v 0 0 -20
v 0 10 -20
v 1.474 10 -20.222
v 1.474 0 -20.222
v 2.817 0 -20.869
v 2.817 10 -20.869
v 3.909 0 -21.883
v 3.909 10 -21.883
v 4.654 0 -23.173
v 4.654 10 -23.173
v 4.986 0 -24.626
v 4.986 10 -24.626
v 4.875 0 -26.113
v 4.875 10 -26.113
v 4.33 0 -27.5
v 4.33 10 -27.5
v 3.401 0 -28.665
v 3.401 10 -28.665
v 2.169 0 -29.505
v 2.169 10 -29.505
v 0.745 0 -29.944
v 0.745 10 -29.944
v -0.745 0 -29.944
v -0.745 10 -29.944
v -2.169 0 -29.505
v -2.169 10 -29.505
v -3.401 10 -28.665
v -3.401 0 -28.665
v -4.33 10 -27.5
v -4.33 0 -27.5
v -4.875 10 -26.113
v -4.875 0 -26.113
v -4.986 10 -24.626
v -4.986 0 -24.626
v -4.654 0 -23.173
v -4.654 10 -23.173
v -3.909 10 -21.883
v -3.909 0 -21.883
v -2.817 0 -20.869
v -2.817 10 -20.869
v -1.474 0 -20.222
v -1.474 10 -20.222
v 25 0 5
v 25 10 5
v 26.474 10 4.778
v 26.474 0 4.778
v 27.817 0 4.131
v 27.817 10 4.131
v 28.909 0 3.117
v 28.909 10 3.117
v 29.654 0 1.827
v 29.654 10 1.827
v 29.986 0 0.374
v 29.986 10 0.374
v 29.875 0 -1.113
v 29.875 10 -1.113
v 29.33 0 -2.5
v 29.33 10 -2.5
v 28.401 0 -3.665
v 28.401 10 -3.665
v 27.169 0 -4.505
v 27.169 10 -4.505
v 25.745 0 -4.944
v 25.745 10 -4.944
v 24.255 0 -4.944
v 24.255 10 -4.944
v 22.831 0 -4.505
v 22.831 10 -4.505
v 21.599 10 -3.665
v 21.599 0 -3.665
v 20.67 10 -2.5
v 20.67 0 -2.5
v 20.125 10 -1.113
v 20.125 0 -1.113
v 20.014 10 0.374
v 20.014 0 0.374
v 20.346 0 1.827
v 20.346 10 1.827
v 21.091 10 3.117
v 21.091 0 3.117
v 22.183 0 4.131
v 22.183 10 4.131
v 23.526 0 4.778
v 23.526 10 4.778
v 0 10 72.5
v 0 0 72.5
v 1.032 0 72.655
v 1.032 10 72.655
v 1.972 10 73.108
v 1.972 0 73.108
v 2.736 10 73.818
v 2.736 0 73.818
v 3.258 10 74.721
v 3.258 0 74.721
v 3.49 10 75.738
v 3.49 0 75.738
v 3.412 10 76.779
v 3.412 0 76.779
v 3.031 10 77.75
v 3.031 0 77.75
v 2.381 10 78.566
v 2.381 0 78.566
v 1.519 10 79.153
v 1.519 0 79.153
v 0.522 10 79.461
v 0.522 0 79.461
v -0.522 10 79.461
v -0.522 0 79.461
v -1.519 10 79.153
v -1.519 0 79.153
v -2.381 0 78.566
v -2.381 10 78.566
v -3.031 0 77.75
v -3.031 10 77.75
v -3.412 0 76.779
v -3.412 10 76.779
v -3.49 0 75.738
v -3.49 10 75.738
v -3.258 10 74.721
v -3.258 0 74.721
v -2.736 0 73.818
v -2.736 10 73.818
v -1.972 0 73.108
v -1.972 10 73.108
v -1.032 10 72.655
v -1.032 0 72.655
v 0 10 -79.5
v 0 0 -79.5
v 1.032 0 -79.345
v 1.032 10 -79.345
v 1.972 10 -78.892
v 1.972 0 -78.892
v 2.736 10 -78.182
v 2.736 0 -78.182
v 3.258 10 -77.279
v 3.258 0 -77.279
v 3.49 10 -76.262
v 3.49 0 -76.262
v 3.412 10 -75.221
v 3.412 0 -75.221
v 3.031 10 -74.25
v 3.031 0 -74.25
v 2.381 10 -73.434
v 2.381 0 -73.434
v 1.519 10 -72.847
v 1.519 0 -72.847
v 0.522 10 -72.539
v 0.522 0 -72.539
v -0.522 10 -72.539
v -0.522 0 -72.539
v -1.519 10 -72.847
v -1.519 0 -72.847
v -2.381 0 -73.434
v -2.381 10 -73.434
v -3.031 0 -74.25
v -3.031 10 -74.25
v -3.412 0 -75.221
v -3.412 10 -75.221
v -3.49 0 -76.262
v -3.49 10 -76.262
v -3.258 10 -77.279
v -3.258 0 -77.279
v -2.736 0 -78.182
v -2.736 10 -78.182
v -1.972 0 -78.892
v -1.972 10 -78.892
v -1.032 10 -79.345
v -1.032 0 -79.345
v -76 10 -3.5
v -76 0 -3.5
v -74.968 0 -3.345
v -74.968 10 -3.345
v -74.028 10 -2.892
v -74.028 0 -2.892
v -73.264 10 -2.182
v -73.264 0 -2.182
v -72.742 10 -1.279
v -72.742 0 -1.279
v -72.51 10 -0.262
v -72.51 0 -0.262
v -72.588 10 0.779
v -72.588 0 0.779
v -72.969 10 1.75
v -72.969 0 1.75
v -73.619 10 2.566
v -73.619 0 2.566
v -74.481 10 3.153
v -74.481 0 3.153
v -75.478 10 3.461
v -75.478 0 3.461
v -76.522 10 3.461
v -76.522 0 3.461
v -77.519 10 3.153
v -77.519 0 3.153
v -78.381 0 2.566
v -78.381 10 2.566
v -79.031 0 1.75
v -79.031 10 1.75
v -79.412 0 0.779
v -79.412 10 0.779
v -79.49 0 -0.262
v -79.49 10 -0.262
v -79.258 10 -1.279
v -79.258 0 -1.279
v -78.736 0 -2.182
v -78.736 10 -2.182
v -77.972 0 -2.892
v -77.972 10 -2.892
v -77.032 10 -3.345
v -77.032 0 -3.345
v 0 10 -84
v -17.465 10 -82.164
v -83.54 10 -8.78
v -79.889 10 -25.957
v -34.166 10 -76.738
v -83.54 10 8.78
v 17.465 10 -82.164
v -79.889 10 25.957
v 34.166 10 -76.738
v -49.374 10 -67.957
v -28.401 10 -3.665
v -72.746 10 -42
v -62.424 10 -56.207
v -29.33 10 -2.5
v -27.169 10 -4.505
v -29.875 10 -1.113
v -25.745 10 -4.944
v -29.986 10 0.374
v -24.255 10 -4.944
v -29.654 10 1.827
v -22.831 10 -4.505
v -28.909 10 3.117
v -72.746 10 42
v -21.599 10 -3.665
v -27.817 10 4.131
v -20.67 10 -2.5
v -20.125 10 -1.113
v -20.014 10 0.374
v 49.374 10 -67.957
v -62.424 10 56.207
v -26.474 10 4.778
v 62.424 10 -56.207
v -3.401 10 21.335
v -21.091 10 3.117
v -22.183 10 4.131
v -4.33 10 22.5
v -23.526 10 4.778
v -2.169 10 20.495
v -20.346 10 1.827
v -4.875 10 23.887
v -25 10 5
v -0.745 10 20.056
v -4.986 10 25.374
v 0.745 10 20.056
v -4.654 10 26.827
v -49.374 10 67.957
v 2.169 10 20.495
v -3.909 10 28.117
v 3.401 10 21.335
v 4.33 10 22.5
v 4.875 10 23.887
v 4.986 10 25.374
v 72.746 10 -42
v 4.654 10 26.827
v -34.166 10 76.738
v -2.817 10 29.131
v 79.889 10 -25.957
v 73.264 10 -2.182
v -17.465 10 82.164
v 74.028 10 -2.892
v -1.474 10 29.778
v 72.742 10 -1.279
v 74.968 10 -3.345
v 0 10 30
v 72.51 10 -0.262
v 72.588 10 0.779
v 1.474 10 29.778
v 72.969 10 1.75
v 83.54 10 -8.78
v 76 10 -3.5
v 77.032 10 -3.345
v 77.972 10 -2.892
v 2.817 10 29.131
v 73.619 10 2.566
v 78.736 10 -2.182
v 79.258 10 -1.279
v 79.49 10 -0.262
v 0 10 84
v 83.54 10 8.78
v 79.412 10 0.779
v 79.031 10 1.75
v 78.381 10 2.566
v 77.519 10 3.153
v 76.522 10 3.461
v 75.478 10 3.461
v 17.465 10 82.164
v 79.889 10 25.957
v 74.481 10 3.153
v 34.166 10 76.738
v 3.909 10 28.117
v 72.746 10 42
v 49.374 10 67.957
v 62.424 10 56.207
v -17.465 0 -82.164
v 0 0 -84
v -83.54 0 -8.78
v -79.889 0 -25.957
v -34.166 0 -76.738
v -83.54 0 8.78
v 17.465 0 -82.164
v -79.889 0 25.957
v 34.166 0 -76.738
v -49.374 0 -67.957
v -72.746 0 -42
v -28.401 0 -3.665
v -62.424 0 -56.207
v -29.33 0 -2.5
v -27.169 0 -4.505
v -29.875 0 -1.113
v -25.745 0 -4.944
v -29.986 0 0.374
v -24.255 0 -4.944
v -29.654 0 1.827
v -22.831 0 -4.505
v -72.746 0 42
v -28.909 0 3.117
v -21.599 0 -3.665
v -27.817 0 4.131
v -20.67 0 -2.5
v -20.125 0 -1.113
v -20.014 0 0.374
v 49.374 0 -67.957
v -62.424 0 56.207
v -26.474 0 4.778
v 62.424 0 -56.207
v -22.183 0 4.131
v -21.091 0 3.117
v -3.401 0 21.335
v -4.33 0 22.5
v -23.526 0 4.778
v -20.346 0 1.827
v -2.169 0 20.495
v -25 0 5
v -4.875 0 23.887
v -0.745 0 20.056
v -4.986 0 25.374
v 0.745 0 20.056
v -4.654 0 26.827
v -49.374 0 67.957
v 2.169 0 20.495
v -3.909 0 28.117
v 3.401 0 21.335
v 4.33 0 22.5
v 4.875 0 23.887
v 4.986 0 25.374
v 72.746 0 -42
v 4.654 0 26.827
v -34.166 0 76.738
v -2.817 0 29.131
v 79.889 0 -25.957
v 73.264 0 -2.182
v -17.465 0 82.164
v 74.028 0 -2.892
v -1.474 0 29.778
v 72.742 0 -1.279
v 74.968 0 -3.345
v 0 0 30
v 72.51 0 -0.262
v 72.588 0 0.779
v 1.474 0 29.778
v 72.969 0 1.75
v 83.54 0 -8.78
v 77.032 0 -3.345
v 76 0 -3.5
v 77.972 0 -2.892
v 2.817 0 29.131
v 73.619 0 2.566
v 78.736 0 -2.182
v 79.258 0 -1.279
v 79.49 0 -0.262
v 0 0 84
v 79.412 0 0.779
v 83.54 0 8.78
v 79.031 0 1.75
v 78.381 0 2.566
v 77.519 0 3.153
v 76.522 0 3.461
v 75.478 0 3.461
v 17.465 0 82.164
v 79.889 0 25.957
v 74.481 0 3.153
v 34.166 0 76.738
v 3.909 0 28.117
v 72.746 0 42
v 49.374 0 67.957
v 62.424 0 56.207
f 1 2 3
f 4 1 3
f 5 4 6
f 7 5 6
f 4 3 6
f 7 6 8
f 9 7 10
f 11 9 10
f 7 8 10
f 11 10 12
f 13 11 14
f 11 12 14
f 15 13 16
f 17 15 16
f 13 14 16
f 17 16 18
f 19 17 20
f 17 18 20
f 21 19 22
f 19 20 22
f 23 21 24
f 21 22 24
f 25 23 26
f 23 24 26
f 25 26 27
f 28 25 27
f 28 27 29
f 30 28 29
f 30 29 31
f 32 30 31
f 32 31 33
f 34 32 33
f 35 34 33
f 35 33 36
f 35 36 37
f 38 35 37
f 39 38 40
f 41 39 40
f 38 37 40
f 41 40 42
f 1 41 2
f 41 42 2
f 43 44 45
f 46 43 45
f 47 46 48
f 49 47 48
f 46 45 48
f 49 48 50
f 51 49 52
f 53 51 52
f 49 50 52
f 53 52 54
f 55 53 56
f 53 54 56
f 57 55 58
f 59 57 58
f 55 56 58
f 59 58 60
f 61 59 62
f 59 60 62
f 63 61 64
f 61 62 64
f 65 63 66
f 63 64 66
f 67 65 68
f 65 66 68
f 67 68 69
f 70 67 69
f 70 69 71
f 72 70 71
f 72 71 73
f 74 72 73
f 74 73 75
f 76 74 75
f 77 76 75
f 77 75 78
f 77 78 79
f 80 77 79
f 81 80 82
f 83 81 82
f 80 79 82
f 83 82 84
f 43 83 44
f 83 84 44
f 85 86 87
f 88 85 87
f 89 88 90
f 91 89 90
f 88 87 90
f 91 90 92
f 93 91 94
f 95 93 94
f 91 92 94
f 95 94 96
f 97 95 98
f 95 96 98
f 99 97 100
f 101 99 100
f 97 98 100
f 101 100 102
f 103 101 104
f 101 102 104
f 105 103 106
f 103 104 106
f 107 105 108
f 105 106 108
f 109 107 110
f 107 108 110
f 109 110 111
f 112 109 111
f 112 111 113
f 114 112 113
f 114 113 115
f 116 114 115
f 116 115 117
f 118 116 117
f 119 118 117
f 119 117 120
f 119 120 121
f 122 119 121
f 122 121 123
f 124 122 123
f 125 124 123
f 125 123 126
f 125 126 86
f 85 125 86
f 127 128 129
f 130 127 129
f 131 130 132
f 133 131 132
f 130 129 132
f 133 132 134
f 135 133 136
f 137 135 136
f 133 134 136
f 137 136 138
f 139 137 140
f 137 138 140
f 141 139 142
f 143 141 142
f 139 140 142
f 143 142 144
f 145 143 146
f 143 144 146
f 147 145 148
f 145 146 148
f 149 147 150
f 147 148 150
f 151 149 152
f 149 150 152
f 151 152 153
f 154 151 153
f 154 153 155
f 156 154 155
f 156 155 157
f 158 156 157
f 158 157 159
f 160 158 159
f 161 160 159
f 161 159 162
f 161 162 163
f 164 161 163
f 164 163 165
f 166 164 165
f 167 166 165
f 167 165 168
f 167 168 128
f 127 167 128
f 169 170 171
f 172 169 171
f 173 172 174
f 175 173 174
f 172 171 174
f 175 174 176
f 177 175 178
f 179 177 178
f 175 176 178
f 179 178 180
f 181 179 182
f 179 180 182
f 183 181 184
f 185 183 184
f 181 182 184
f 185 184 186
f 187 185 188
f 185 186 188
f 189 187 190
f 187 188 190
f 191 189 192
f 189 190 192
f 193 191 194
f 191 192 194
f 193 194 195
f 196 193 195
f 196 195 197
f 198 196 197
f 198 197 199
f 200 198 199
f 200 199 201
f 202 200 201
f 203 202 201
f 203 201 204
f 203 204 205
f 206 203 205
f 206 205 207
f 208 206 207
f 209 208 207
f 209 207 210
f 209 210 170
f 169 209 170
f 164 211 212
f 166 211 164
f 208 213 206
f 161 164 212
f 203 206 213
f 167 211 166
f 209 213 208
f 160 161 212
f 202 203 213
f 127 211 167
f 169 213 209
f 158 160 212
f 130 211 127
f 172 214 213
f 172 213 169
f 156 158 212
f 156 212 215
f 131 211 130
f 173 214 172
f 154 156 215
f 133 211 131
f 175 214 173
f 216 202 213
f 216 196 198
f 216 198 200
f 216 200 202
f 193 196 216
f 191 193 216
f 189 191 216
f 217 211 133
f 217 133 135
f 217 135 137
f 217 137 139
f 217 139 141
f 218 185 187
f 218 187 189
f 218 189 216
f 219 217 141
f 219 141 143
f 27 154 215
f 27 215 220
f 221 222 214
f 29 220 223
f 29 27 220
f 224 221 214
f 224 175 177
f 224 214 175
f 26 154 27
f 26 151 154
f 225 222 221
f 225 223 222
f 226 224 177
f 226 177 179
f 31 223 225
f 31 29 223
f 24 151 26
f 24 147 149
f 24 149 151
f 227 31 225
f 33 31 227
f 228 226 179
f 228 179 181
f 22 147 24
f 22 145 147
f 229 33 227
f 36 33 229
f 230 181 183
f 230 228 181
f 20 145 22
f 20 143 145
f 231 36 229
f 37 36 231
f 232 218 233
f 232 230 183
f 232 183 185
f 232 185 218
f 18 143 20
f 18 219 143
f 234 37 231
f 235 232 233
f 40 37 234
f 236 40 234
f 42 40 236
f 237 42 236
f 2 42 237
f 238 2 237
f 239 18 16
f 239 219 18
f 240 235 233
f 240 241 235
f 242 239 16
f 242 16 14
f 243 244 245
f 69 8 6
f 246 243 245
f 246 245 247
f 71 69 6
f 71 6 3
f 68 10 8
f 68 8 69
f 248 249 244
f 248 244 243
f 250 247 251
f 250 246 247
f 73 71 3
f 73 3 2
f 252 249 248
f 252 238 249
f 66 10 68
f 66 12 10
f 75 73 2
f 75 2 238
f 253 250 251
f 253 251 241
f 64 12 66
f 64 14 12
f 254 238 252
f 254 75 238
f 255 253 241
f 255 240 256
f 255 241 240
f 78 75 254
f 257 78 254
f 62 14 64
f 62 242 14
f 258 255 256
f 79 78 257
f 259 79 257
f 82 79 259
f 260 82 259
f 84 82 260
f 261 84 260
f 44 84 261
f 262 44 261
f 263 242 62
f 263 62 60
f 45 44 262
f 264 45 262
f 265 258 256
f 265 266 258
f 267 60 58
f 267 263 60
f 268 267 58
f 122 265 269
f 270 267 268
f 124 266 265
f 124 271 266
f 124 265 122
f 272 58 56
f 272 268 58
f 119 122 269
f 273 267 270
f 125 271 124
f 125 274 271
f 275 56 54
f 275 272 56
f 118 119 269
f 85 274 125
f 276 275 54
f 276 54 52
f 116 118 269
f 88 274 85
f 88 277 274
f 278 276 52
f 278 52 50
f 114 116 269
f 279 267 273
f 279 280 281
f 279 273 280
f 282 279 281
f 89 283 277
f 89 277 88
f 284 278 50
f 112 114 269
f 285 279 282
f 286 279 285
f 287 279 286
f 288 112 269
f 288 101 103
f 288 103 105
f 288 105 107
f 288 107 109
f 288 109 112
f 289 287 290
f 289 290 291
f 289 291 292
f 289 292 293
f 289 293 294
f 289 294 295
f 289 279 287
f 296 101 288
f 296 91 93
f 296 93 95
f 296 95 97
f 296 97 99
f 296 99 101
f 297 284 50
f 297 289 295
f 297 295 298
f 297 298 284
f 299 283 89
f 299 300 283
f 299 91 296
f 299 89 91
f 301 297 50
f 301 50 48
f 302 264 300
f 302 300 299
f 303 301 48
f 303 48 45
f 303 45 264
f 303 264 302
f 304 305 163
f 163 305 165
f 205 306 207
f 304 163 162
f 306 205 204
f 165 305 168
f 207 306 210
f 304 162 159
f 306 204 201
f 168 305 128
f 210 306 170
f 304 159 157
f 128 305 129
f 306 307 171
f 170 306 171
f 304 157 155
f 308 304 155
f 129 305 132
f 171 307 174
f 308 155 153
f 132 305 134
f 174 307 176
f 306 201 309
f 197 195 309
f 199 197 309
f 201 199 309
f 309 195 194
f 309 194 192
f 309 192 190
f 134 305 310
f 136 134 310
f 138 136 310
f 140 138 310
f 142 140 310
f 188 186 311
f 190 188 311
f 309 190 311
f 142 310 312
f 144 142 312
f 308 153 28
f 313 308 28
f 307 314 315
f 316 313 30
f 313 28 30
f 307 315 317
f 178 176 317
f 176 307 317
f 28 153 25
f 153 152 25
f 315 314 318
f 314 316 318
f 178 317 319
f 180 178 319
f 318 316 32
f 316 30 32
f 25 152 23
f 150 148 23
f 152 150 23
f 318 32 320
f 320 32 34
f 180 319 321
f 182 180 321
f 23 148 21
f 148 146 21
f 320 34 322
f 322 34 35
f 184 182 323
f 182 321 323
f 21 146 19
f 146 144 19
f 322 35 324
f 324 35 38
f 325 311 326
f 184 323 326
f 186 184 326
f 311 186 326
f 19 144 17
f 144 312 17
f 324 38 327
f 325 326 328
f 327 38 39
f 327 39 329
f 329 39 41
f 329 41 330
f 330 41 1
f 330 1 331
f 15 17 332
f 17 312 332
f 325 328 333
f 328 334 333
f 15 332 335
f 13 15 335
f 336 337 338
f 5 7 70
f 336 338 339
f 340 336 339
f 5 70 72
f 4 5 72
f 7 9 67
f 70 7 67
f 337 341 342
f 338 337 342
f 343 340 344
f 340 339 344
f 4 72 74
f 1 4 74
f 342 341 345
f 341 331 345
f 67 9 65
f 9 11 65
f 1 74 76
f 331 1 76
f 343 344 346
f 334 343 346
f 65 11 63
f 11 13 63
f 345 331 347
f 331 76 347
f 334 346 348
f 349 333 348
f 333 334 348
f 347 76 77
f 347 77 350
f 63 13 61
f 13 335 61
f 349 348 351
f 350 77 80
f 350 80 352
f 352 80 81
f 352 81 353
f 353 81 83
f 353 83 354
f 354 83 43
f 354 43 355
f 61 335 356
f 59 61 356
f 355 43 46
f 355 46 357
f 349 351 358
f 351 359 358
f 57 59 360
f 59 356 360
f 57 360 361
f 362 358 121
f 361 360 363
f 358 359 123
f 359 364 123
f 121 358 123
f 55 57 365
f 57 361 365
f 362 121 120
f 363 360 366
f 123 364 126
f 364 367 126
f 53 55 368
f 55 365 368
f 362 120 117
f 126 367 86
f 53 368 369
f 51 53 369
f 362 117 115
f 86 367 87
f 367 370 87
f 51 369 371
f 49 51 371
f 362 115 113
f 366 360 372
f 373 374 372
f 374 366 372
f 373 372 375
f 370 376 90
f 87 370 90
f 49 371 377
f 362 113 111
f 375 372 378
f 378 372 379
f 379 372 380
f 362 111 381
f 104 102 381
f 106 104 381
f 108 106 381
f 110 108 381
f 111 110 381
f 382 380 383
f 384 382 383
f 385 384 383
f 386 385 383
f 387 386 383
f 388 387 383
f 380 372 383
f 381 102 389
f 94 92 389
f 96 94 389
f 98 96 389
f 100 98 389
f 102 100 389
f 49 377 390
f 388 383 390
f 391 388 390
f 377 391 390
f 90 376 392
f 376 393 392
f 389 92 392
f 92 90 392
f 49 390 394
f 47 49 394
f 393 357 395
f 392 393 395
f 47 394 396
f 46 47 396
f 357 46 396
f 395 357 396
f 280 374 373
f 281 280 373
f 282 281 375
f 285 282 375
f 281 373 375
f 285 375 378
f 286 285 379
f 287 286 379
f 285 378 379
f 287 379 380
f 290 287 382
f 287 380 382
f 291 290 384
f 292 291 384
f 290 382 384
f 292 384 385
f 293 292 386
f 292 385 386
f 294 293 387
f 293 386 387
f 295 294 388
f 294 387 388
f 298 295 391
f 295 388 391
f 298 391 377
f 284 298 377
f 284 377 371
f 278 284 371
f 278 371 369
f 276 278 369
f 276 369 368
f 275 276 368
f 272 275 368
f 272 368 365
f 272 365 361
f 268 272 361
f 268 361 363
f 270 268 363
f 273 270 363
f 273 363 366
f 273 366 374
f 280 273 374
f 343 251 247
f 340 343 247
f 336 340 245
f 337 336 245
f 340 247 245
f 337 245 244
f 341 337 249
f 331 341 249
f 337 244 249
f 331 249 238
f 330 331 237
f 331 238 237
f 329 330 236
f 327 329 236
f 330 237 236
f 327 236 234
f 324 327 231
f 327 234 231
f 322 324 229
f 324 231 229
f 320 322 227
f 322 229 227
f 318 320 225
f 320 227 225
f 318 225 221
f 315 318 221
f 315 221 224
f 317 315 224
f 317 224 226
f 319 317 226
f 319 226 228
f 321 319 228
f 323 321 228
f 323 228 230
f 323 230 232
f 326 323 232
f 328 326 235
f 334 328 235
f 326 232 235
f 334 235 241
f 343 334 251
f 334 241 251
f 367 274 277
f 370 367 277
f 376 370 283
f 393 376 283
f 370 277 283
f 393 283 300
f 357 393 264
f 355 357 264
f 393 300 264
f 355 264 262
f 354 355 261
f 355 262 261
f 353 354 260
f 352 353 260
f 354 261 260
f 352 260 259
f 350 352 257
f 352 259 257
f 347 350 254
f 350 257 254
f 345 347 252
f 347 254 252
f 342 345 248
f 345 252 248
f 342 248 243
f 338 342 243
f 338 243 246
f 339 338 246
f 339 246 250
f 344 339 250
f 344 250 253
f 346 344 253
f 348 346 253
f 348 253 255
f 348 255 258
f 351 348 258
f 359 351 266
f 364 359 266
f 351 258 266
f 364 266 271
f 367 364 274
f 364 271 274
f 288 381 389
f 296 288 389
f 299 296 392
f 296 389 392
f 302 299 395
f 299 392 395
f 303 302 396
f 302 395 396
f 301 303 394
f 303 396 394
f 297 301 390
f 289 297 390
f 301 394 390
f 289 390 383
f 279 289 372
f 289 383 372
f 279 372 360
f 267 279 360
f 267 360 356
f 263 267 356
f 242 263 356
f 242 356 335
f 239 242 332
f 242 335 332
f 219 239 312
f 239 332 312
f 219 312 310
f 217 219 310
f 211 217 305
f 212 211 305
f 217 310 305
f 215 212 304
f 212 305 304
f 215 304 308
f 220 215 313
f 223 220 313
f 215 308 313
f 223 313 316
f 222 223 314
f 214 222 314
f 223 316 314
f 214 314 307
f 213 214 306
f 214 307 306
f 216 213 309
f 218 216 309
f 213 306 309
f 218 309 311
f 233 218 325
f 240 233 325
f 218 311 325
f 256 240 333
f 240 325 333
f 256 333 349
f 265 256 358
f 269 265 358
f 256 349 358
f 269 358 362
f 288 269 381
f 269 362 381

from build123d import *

# Parameters (mm, degrees)
SKETCH1_R            = 84
BOSS_EXTRUDE1_DEPTH  = 10
M6_CLEARANCE_HOLE1_D = 7
SKETCH4_R            = 5
CUT_EXTRUDE1_DEPTH   = 10


with BuildPart() as part:
    # Sketch1 → Boss-Extrude1 (new body)
    with BuildSketch(Plane(origin=(0, 0, 0), x_dir=(1, 0, 0), z_dir=(0, 1, 0))):
        with Locations(Location((0, 0, 0), (0, 0, 270))):
            Circle(SKETCH1_R)
    extrude(amount=BOSS_EXTRUDE1_DEPTH)

    # M6 Clearance Hole1 (through all)
    with Locations(Plane(origin=(0, 10, -76), x_dir=(0, 0, 1), z_dir=(0, 1, 0))):
        with Locations((0, 0), (76, -76), (152, 0), (76, 76)):
            Hole(M6_CLEARANCE_HOLE1_D / 2)

    # Sketch4 → Cut-Extrude1 (cut)
    with BuildSketch(Plane(origin=(0, 10, 0), x_dir=(1, 0, 0), z_dir=(0, 1, 0))):
        with Locations(Location((0, 25, 0), (0, 0, 270))):
            Circle(SKETCH4_R)
        with Locations(Location((25, 0, 0), (0, 0, 270))):
            Circle(SKETCH4_R)
        with Locations(Location((-25, 0, 0), (0, 0, 270))):
            Circle(SKETCH4_R)
        with Locations(Location((0, -25, 0), (0, 0, 270))):
            Circle(SKETCH4_R)
    extrude(amount=-CUT_EXTRUDE1_DEPTH, mode=Mode.SUBTRACT)


solid = part.part
